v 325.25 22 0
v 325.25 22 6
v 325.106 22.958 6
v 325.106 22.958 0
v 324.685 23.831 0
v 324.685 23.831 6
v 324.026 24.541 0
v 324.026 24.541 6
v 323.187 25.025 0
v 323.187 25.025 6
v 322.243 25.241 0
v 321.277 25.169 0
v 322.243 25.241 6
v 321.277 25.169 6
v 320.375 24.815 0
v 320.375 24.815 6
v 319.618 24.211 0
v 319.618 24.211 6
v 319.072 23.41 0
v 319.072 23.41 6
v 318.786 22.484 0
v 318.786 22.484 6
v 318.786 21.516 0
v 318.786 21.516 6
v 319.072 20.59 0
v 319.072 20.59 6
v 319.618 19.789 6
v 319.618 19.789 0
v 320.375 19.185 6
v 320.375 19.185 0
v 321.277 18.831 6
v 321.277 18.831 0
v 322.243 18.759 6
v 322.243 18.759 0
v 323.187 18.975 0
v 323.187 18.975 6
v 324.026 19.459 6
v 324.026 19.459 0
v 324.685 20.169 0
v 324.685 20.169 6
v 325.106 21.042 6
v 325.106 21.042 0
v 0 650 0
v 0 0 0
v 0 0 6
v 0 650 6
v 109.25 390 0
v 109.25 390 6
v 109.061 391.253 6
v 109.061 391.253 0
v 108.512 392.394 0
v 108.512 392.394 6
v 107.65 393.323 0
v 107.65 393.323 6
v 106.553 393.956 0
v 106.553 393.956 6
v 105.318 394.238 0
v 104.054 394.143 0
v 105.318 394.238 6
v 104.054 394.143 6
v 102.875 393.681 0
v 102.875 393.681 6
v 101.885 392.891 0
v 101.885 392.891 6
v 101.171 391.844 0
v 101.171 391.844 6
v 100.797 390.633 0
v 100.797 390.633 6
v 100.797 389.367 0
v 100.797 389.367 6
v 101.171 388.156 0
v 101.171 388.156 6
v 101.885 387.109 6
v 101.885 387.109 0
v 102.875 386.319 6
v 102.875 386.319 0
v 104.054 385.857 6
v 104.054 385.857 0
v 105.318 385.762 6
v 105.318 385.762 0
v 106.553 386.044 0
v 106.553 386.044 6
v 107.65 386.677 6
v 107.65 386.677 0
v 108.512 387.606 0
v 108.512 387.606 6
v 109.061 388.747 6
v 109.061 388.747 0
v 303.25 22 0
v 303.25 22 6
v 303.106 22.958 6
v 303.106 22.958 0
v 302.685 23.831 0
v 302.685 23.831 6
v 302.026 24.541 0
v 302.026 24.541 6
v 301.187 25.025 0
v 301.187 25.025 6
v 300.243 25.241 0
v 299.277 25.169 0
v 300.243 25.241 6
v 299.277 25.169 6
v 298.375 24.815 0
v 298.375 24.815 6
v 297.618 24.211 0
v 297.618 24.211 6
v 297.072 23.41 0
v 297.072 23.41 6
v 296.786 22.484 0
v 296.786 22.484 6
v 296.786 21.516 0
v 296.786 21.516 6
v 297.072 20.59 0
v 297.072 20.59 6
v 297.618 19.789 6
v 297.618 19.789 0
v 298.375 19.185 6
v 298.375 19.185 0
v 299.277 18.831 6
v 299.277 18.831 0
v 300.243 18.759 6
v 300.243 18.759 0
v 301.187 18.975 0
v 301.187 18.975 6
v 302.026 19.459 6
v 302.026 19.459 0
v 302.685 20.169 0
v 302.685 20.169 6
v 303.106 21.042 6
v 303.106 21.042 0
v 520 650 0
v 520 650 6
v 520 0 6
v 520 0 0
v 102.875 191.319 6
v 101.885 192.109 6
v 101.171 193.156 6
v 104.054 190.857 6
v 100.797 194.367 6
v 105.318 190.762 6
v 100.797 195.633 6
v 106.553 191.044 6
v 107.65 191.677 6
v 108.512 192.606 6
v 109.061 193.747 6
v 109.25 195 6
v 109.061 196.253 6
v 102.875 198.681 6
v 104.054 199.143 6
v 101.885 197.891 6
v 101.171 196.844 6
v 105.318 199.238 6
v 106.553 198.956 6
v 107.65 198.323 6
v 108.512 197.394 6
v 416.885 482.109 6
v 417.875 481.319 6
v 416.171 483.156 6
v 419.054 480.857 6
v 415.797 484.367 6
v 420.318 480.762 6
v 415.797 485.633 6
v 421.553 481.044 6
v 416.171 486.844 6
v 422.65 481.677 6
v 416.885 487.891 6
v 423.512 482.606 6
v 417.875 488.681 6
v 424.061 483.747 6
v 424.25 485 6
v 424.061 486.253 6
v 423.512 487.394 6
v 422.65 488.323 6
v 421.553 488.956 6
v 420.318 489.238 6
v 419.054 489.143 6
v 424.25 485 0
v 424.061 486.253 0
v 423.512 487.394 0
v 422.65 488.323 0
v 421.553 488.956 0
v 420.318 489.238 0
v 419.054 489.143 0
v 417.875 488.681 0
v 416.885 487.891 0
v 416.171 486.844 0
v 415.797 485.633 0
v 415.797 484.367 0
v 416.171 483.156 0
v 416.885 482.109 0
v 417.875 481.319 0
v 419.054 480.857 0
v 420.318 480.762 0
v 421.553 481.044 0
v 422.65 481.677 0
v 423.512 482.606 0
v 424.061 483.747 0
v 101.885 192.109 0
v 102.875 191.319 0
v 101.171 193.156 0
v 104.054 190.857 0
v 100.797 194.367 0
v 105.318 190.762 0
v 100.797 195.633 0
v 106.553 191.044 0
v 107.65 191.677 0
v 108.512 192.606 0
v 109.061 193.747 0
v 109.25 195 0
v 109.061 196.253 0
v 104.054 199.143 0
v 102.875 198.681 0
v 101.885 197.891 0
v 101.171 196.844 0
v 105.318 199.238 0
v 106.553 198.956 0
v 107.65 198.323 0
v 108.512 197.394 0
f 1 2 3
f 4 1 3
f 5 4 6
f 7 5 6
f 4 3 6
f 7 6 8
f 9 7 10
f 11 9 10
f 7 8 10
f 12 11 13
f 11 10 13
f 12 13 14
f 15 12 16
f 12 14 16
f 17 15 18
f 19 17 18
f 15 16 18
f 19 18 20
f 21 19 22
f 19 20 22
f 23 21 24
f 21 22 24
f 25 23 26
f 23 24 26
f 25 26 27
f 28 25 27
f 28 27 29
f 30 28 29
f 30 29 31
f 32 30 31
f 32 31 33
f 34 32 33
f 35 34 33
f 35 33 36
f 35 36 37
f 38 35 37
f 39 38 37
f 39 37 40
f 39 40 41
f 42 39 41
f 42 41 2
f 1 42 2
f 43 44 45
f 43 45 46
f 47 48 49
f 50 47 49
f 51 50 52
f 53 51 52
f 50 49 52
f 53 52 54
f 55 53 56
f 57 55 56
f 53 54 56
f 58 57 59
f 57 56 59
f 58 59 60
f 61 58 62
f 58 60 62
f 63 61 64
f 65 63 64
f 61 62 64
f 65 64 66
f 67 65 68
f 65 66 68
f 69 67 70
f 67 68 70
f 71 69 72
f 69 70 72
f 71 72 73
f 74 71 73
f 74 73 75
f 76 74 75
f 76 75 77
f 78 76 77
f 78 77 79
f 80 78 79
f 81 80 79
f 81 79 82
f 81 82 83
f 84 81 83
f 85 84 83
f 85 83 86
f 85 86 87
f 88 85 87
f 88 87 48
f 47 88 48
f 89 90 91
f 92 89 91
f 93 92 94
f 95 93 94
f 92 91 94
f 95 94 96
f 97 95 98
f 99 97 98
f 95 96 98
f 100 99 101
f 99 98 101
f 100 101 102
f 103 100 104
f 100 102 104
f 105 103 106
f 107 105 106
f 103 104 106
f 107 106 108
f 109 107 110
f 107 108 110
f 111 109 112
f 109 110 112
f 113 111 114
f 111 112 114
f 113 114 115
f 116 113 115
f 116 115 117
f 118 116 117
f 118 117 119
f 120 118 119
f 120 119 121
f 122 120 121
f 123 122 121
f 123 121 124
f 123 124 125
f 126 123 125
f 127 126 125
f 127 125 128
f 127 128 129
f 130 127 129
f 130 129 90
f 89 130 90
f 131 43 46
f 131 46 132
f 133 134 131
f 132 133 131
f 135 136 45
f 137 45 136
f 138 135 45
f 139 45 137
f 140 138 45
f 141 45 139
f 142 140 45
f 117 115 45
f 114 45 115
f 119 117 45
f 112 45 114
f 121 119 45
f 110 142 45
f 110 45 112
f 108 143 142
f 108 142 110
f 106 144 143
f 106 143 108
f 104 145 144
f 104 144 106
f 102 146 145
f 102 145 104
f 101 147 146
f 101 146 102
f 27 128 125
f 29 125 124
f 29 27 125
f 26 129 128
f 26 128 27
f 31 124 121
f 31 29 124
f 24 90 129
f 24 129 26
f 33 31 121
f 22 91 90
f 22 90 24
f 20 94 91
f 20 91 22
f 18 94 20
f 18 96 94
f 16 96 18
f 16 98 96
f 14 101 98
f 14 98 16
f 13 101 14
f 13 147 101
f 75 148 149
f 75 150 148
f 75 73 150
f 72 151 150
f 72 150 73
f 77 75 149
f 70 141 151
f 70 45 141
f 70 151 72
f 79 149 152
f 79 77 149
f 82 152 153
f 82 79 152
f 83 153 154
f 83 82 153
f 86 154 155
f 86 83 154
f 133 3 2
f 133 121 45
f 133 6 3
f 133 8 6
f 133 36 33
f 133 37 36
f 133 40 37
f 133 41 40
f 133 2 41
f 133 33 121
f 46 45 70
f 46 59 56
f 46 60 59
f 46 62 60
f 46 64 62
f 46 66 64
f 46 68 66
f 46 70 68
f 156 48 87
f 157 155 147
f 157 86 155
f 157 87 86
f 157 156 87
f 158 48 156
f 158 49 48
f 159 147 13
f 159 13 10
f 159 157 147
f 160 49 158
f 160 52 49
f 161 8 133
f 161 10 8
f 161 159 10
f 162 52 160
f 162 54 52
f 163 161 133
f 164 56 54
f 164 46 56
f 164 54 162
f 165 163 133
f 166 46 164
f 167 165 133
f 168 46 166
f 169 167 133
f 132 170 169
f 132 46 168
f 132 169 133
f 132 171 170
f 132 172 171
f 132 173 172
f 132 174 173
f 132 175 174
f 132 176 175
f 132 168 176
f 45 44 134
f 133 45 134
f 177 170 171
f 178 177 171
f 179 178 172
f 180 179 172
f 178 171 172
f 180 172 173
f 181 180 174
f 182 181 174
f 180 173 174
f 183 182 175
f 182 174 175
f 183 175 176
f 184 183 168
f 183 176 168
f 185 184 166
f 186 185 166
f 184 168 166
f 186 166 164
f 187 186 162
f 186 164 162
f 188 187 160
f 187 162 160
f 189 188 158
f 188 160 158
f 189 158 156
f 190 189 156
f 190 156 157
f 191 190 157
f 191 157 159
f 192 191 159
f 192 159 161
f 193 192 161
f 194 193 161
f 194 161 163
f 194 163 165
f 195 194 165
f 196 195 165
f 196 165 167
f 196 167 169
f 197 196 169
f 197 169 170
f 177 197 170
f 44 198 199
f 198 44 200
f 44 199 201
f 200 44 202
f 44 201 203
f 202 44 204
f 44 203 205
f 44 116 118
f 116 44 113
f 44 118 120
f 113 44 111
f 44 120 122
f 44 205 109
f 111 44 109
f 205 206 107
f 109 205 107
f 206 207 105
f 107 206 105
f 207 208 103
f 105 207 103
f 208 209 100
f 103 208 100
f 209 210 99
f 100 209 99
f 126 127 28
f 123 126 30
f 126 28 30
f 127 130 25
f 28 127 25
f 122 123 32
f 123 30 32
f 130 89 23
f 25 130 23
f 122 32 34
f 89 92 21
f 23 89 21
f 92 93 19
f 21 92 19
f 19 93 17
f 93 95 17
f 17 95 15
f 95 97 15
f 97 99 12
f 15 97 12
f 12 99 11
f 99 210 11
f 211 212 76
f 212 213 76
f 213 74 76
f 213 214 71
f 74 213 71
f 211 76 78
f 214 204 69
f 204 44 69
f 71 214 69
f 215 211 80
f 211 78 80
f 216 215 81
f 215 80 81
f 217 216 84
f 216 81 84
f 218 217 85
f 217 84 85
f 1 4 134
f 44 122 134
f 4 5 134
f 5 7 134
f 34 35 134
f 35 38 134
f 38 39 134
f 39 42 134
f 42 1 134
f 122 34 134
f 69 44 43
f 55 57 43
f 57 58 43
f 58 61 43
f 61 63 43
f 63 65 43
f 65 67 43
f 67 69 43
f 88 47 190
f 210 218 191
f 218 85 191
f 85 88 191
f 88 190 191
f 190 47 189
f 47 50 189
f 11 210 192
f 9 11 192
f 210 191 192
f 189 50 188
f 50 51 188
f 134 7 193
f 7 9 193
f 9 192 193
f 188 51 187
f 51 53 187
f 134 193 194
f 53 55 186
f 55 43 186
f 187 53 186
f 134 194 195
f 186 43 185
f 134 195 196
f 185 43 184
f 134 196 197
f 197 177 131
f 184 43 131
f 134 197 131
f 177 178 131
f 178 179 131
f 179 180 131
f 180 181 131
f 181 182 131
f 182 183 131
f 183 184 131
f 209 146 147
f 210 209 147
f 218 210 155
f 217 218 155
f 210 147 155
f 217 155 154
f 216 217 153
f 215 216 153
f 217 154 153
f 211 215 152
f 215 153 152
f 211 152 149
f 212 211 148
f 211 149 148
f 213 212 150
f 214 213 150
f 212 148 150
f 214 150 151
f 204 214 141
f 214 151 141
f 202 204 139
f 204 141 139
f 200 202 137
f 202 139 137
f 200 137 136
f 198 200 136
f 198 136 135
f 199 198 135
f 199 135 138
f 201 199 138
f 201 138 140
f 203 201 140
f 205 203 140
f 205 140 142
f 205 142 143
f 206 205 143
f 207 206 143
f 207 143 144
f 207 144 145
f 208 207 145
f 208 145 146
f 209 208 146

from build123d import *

# Parameters (mm, degrees)
ESQUISSE1_W             = 520
ESQUISSE1_H             = 650
BASE_EXTRUSION_DEPTH    = 6
ENL_V_MAT_EXTRU_1_REACH = 834.428
ESQUISSE2_R             = 4.25
ENL_V_MAT_EXTRU_2_REACH = 834.428
ESQUISSE3_R             = 3.25


with BuildPart() as part:
    # Esquisse1 → Base-Extrusion (new body)
    with BuildSketch(Plane.XY):
        with Locations((260, 325)):
            Rectangle(ESQUISSE1_W, ESQUISSE1_H)
    extrude(amount=BASE_EXTRUSION_DEPTH)

    # Esquisse2 → Enlèv. mat.-Extru.1 (cut, up to next)
    with BuildSketch(Plane.XY.offset(6), mode=Mode.PRIVATE) as enl_v_mat_extru_1_sk1:
        with Locations((420, 485)):
            Circle(ESQUISSE2_R)
    enl_v_mat_extru_1_tool1 = extrude(enl_v_mat_extru_1_sk1.sketch, amount=-ENL_V_MAT_EXTRU_1_REACH, mode=Mode.PRIVATE) & part.part
    # Esquisse2 → Enlèv. mat.-Extru.1 (cut, up to next)
    with BuildSketch(Plane.XY.offset(6), mode=Mode.PRIVATE) as enl_v_mat_extru_1_sk2:
        with Locations((105, 390)):
            Circle(ESQUISSE2_R)
    enl_v_mat_extru_1_tool2 = extrude(enl_v_mat_extru_1_sk2.sketch, amount=-ENL_V_MAT_EXTRU_1_REACH, mode=Mode.PRIVATE) & part.part
    # Esquisse2 → Enlèv. mat.-Extru.1 (cut, up to next)
    with BuildSketch(Plane.XY.offset(6), mode=Mode.PRIVATE) as enl_v_mat_extru_1_sk3:
        with Locations((105, 195)):
            Circle(ESQUISSE2_R)
    enl_v_mat_extru_1_tool3 = extrude(enl_v_mat_extru_1_sk3.sketch, amount=-ENL_V_MAT_EXTRU_1_REACH, mode=Mode.PRIVATE) & part.part
    add(enl_v_mat_extru_1_tool1.solids().sort_by_distance((420, 485, 6))[0], mode=Mode.SUBTRACT)
    add(enl_v_mat_extru_1_tool2.solids().sort_by_distance((105, 390, 6))[0], mode=Mode.SUBTRACT)
    add(enl_v_mat_extru_1_tool3.solids().sort_by_distance((105, 195, 6))[0], mode=Mode.SUBTRACT)

    # Esquisse3 → Enlèv. mat.-Extru.2 (cut, up to next)
    with BuildSketch(Plane.XY.offset(6), mode=Mode.PRIVATE) as enl_v_mat_extru_2_sk1:
        with Locations((300, 22)):
            Circle(ESQUISSE3_R)
    enl_v_mat_extru_2_tool1 = extrude(enl_v_mat_extru_2_sk1.sketch, amount=-ENL_V_MAT_EXTRU_2_REACH, mode=Mode.PRIVATE) & part.part
    # Esquisse3 → Enlèv. mat.-Extru.2 (cut, up to next)
    with BuildSketch(Plane.XY.offset(6), mode=Mode.PRIVATE) as enl_v_mat_extru_2_sk2:
        with Locations((322, 22)):
            Circle(ESQUISSE3_R)
    enl_v_mat_extru_2_tool2 = extrude(enl_v_mat_extru_2_sk2.sketch, amount=-ENL_V_MAT_EXTRU_2_REACH, mode=Mode.PRIVATE) & part.part
    add(enl_v_mat_extru_2_tool1.solids().sort_by_distance((300, 22, 6))[0], mode=Mode.SUBTRACT)
    add(enl_v_mat_extru_2_tool2.solids().sort_by_distance((322, 22, 6))[0], mode=Mode.SUBTRACT)


solid = part.part
